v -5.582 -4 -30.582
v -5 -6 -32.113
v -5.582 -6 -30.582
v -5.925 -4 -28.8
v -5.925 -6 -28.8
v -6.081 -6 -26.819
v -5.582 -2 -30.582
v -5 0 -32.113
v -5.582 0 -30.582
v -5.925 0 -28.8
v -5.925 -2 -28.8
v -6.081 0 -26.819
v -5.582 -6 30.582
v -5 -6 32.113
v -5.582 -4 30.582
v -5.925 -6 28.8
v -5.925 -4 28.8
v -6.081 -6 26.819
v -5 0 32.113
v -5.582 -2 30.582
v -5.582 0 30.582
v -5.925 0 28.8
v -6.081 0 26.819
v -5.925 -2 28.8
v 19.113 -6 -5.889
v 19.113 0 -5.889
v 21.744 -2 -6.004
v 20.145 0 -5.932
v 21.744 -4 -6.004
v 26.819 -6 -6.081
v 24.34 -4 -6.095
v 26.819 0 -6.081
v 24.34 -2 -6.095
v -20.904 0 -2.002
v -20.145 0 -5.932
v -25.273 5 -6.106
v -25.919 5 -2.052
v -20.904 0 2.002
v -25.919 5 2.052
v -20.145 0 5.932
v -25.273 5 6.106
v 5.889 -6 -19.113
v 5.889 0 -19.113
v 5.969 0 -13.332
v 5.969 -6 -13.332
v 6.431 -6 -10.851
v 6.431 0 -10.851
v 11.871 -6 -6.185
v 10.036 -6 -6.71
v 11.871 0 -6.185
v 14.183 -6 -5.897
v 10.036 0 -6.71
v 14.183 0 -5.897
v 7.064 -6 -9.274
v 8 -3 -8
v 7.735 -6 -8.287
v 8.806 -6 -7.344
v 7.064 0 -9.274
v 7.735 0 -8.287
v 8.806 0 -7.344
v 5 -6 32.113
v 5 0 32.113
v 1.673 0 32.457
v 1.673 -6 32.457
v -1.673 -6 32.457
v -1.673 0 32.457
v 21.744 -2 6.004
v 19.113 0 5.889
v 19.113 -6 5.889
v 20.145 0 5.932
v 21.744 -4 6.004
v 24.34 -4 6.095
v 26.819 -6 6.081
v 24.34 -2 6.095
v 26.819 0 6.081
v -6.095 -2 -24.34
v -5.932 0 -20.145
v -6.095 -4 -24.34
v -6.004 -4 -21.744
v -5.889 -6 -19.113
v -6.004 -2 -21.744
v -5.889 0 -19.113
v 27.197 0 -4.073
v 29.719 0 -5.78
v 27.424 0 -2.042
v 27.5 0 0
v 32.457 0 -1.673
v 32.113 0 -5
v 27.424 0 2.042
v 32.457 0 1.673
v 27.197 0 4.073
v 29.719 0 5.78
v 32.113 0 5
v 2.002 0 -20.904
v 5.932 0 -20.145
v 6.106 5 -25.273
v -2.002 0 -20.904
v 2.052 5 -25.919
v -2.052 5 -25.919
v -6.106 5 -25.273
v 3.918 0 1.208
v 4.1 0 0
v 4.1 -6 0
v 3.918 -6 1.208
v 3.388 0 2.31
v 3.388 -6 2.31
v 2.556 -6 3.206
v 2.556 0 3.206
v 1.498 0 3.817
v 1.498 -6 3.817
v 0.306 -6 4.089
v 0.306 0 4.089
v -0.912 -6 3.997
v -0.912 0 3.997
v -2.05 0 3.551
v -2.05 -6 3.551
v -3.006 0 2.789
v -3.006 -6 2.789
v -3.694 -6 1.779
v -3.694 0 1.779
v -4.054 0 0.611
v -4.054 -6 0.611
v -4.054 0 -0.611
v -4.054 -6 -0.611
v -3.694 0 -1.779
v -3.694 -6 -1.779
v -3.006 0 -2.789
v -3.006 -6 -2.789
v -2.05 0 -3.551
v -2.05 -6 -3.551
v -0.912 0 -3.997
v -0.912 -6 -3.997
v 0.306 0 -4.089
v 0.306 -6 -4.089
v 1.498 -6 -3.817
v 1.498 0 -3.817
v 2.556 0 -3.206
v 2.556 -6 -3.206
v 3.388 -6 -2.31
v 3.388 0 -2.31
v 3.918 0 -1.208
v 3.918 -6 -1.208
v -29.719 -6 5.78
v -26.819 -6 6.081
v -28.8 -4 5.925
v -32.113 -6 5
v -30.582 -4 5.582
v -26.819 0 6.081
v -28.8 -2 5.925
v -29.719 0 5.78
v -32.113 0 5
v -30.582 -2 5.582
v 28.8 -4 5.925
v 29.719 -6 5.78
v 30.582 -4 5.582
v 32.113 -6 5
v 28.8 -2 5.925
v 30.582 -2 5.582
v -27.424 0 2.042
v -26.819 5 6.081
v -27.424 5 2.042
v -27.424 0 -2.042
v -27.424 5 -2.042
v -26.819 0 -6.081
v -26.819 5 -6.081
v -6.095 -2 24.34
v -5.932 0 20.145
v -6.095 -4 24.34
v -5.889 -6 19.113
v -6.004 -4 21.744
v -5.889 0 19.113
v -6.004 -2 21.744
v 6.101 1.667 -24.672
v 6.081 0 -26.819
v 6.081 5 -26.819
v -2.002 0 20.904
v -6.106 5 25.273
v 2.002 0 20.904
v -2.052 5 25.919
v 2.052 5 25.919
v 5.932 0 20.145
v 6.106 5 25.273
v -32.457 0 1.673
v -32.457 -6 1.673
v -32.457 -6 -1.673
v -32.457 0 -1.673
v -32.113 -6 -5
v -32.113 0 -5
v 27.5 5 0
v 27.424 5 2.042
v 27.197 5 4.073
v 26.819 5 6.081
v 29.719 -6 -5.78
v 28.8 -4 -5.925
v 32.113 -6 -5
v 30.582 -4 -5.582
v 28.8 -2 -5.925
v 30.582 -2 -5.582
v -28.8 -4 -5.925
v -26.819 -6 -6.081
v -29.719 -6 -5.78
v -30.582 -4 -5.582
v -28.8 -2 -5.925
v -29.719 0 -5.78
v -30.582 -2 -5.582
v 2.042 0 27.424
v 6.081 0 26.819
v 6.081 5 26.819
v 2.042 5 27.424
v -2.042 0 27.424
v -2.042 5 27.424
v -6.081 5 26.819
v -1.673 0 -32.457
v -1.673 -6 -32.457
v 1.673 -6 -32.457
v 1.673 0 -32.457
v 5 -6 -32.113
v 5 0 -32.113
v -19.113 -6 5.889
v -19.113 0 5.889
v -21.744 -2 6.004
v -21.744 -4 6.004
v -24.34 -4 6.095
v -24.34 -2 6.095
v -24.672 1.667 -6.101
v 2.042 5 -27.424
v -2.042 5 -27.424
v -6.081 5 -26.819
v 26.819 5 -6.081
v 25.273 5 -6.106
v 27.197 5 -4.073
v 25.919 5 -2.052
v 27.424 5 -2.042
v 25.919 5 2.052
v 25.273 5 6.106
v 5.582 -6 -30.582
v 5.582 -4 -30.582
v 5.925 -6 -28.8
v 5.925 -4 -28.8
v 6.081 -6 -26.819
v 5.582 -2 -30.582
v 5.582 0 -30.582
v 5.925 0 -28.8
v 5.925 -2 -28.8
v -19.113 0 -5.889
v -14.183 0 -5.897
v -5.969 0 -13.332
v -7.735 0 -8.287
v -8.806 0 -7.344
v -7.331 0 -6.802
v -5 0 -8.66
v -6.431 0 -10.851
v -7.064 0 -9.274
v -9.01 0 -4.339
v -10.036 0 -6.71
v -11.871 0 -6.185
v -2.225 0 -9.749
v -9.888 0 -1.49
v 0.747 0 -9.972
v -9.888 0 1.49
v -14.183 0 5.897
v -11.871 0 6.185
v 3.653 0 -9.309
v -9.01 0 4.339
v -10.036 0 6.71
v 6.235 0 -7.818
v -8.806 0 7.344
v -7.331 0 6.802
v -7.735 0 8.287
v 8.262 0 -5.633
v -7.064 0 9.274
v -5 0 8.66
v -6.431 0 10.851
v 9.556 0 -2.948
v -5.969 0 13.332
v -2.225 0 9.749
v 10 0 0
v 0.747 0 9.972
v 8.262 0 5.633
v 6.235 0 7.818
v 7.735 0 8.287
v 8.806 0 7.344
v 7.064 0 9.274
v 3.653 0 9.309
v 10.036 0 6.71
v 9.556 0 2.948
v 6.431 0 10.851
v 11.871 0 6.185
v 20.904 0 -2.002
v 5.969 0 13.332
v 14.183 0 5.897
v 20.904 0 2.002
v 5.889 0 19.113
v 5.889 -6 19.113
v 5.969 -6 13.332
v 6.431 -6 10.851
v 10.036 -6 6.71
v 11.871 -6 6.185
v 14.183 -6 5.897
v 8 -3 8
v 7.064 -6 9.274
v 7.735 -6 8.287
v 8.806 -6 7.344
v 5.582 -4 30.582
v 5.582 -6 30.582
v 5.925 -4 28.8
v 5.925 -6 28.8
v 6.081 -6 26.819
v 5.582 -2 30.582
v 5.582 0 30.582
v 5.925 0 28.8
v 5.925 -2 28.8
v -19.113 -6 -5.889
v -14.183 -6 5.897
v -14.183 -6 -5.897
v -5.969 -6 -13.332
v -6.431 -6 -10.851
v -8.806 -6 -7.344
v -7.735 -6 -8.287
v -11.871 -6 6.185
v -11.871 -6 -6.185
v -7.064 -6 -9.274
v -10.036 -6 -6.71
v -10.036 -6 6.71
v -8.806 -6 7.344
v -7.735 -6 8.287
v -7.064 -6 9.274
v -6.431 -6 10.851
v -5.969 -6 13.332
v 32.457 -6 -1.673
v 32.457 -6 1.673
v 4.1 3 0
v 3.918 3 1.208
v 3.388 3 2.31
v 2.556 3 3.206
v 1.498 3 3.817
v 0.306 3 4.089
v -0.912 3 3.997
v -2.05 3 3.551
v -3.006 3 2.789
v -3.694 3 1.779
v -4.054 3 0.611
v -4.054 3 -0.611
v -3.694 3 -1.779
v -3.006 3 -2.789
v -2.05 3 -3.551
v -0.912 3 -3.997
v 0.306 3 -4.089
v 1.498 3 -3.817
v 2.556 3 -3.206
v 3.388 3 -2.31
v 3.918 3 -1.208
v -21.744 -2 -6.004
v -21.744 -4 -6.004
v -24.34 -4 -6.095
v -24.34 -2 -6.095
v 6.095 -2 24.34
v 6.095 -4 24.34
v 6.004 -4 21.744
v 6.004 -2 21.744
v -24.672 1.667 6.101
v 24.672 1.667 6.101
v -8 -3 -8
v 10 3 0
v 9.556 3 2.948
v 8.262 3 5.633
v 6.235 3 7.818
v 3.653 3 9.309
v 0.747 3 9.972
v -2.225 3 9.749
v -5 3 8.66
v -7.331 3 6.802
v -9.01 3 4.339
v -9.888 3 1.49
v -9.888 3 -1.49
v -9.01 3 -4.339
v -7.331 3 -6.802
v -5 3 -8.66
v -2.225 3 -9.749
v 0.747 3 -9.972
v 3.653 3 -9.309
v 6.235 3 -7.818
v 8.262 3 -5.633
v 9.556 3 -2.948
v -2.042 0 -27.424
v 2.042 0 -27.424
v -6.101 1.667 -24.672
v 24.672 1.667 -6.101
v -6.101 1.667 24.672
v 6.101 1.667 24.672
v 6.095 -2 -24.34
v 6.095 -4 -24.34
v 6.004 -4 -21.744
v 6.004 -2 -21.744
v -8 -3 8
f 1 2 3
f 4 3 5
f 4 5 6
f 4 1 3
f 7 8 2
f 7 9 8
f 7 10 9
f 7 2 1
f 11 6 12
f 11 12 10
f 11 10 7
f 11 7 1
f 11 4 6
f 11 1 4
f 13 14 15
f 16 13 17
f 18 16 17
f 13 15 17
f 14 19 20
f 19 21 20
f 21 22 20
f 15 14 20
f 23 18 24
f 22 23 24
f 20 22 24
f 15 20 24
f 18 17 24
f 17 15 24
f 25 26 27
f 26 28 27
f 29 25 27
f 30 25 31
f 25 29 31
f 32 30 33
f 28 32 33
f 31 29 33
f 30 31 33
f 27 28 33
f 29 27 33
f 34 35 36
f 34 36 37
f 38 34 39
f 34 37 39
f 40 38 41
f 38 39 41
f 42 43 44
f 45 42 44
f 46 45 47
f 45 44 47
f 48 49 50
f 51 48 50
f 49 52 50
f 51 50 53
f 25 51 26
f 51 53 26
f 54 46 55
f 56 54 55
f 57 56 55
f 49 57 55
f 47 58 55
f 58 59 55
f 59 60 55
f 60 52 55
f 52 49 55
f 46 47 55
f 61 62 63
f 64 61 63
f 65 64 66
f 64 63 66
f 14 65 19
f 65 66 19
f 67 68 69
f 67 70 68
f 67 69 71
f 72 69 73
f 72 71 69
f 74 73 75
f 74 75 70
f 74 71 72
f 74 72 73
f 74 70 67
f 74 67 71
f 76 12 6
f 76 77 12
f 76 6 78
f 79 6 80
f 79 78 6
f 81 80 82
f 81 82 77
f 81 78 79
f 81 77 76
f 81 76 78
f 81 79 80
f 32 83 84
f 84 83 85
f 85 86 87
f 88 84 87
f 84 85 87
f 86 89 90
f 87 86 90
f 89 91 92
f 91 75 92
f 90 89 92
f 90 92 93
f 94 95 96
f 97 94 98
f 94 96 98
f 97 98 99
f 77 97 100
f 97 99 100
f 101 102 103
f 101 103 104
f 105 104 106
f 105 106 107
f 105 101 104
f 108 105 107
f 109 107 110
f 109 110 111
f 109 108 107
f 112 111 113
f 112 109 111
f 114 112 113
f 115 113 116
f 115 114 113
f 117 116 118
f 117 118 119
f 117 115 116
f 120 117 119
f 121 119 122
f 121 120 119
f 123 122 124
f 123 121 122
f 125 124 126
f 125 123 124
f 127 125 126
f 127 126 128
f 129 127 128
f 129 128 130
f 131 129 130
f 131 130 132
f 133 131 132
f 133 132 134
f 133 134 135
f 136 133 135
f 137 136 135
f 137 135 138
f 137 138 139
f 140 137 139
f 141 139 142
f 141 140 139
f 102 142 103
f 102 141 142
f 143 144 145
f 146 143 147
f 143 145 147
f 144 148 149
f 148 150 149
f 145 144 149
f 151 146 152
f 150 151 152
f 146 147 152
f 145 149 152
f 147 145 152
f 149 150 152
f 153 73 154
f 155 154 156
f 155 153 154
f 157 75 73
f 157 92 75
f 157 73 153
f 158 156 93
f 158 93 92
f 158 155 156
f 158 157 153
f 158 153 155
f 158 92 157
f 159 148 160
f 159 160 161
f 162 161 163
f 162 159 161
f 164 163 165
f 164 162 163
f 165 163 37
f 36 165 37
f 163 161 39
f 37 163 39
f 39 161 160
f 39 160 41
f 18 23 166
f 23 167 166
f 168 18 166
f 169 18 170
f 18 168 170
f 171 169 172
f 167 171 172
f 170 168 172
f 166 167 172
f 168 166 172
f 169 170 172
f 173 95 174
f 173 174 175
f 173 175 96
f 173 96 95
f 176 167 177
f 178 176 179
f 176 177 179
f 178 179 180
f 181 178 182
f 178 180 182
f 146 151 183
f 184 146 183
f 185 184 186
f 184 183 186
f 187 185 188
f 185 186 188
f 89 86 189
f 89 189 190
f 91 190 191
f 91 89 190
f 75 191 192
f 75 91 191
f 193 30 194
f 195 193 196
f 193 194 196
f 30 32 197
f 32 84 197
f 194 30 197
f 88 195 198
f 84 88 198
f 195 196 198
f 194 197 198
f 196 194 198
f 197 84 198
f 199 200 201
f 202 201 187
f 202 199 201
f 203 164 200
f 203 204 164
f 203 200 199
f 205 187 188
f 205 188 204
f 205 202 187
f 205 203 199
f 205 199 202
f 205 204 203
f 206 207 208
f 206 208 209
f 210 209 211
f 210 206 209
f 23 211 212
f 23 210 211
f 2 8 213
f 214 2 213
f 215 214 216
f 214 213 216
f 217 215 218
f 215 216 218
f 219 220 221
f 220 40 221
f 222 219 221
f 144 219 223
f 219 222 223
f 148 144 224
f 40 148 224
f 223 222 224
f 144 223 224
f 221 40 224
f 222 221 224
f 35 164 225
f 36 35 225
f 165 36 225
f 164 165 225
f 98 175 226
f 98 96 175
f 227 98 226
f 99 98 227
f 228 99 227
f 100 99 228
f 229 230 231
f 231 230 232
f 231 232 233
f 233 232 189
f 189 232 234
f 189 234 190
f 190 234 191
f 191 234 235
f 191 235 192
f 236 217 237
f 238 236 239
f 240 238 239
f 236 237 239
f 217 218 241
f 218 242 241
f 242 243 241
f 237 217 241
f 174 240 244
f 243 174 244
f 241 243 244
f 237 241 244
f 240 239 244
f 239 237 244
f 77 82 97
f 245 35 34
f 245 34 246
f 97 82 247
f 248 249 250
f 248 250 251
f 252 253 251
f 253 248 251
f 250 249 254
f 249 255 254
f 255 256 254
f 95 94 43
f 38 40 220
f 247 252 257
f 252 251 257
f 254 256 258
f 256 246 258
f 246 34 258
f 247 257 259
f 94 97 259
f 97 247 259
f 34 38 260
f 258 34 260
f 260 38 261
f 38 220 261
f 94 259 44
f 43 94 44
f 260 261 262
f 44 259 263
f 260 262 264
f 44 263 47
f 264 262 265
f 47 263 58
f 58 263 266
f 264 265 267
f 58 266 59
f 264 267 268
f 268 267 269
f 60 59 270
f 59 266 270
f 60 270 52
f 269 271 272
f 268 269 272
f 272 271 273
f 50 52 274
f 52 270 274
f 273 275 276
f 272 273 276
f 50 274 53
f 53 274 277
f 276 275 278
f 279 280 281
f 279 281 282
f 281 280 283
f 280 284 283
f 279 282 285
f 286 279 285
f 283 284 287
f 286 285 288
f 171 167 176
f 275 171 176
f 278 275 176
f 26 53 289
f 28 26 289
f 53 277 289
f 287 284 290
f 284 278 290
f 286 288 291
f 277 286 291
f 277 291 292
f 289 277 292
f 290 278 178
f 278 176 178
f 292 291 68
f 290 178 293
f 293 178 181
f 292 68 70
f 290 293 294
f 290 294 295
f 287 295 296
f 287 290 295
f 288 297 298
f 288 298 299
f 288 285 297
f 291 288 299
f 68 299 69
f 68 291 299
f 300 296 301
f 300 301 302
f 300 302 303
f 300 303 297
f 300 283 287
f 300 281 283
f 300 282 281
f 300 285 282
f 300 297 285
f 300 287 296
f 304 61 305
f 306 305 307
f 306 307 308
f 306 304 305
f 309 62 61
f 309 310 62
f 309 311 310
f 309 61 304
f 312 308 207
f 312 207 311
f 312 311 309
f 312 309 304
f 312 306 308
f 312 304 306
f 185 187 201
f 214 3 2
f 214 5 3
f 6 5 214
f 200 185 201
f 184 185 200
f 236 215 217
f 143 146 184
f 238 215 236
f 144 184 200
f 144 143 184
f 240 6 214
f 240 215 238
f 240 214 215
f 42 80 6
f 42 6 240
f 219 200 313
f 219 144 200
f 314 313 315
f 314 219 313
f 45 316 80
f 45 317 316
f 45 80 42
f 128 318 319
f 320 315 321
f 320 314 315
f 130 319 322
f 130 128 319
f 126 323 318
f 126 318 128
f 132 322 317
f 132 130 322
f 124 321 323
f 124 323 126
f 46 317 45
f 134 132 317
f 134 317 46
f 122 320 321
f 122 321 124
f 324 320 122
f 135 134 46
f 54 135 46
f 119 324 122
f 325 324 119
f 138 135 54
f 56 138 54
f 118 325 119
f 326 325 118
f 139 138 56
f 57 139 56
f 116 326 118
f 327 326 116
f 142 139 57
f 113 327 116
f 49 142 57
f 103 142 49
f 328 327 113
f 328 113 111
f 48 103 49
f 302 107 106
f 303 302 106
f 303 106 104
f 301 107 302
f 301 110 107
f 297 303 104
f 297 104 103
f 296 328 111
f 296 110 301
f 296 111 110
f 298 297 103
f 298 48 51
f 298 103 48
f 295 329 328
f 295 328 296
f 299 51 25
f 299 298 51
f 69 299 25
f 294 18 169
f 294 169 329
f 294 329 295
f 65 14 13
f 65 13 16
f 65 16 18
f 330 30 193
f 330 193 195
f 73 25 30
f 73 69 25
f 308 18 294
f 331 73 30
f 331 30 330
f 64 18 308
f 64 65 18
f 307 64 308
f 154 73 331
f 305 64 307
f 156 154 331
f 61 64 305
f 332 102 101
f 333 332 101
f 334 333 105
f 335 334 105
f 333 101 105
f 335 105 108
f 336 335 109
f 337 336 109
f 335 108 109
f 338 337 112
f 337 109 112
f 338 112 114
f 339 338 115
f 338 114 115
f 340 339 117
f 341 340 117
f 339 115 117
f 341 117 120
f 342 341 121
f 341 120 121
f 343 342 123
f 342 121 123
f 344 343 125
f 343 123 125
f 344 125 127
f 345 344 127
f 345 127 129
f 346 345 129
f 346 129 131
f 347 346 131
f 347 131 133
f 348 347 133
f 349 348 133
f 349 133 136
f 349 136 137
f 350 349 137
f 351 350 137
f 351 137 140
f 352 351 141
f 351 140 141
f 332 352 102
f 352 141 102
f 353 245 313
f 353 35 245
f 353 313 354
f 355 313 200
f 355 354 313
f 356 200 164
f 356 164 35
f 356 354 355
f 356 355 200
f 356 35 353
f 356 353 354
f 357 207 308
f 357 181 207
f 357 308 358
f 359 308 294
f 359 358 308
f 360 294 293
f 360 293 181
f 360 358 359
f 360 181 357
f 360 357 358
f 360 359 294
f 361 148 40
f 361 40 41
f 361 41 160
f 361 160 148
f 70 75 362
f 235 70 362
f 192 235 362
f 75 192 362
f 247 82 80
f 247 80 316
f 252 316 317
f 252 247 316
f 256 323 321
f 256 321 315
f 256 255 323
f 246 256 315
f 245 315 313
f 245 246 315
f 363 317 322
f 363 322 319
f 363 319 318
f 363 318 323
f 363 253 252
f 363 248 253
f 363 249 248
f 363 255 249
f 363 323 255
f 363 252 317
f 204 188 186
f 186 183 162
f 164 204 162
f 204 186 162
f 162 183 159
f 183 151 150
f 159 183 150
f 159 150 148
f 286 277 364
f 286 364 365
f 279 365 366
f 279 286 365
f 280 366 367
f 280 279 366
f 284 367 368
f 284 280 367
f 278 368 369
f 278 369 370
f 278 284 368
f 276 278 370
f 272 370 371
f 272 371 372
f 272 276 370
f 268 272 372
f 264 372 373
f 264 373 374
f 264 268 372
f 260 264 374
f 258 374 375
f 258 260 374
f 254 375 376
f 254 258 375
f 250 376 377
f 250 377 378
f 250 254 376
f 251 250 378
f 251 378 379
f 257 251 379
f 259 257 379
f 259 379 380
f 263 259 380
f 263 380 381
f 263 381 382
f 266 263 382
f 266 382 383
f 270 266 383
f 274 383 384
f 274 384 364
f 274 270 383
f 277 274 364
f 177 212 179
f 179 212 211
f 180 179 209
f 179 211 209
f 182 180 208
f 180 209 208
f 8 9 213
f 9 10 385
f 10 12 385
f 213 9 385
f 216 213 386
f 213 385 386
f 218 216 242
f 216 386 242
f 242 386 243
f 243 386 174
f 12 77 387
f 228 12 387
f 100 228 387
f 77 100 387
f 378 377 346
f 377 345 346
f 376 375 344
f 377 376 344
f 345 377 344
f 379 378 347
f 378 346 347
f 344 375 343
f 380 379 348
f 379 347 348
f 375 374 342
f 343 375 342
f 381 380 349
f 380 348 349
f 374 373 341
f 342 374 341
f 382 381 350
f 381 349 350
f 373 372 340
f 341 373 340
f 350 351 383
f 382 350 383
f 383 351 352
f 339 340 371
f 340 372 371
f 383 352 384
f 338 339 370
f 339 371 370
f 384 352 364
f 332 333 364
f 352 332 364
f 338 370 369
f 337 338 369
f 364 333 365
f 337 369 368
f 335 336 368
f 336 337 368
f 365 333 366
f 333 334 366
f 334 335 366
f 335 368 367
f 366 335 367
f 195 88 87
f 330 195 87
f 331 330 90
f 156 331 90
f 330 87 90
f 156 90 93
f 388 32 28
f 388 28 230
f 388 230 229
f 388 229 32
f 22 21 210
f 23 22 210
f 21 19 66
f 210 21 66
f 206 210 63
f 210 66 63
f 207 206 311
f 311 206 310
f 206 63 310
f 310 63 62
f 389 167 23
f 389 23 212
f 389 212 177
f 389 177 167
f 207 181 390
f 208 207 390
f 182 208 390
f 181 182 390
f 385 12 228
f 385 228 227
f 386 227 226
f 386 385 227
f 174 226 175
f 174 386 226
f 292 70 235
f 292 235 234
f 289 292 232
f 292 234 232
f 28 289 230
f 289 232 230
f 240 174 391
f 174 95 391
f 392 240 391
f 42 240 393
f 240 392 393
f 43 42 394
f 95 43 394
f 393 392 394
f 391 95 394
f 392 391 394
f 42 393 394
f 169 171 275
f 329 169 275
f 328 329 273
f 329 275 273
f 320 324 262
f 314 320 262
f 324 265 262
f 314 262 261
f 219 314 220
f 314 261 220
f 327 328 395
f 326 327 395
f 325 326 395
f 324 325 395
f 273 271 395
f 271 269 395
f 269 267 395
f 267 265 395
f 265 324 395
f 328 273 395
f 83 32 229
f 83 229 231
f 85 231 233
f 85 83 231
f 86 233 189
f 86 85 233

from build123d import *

# Parameters (mm, degrees)
F0_R         = 10
F0_R_2       = 4.1
F1_DEPTH     = 6
F2_DEPTH     = 5
F3_T4_ANGLE  = 122.6619234407
F3_T9_ANGLE  = 122.6619234407
F3_T14_ANGLE = 122.6619234407
F3_T19_ANGLE = 122.6619234407
F4_DEPTH     = 3


# Not quite as in the source:
# - a fillet or chamfer that OpenCascade refuses, or shapes differently, is made with other operations: its cross-section is extruded or revolved along the edge and cut away or added


with BuildPart() as f1:
    # F0 (on Front) → F1 (new body)
    with BuildSketch(Plane.XZ):
        with BuildLine():
            ThreePointArc((6.0812075174, 26.8191893079), (0, 27.5), (-6.0812075174, 26.8191893079))
            add(Edge.make_bspline(
                [(-6.0812075174, 26.8191893079), (-6.1732948606, 24.4249400285), (-5.9896734895, 21.7342705806), (-5.8889521452, 19.1133524697)],
                knots=[0.1196507891, 0.1196507891, 0.1196507891, 0.1196507891, 0.2585348809, 0.2585348809, 0.2585348809, 0.2585348809], degree=3))
            ThreePointArc((-5.8889521452, 19.1133524697), (0, 20), (5.8889521452, 19.1133524697))
            add(Edge.make_bspline(
                [(6.0812075174, 26.8191893079), (6.1732948606, 24.4249400285), (5.9896734895, 21.7342705806), (5.8889521452, 19.1133524697)],
                knots=[0.1196507891, 0.1196507891, 0.1196507891, 0.1196507891, 0.2585348809, 0.2585348809, 0.2585348809, 0.2585348809], degree=3))
        make_face()
        with BuildLine():
            add(Edge.make_bspline(
                [(26.8191893079, 6.0812075174), (28.8818720221, 6.0018728496), (30.7245490644, 5.7179047345), (32.1130814467, 5)],
                knots=[0.8803492109, 0.8803492109, 0.8803492109, 0.8803492109, 1, 1, 1, 1], degree=3))
            ThreePointArc((26.8191893079, 6.0812075174), (27.3292673334, 3.0595991595), (27.5, 0))
            ThreePointArc((27.5, 0), (27.3292673334, -3.0595991595), (26.8191893079, -6.0812075174))
            add(Edge.make_bspline(
                [(26.8191893079, -6.0812075174), (28.8818720221, -6.0018728496), (30.7245490644, -5.7179047345), (32.1130814467, -5)],
                knots=[0.8803492109, 0.8803492109, 0.8803492109, 0.8803492109, 1, 1, 1, 1], degree=3))
            ThreePointArc((32.1130814467, -5), (32.4031259836, -2.5074741258), (32.5, 0))
            ThreePointArc((32.5, 0), (32.4031259836, 2.5074741258), (32.1130814467, 5))
        make_face()
        with BuildLine():
            ThreePointArc((5, 32.1130814467), (0, 32.5), (-5, 32.1130814467))
            add(Edge.make_bspline(
                [(-5, 32.1130814467), (-5.7179047345, 30.7245490644), (-6.0018728496, 28.8818720221), (-6.0812075174, 26.8191893079)],
                knots=[0, 0, 0, 0, 0.1196507891, 0.1196507891, 0.1196507891, 0.1196507891], degree=3))
            ThreePointArc((-6.0812075174, 26.8191893079), (0, 27.5), (6.0812075174, 26.8191893079))
            add(Edge.make_bspline(
                [(5, 32.1130814467), (5.7179047345, 30.7245490644), (6.0018728496, 28.8818720221), (6.0812075174, 26.8191893079)],
                knots=[0, 0, 0, 0, 0.1196507891, 0.1196507891, 0.1196507891, 0.1196507891], degree=3))
        make_face()
        with BuildLine():
            add(Edge.make_bspline(
                [(-5, -32.1130814467), (-5.7179047345, -30.7245490644), (-6.0018728496, -28.8818720221), (-6.0812075174, -26.8191893079)],
                knots=[0, 0, 0, 0, 0.1196507891, 0.1196507891, 0.1196507891, 0.1196507891], degree=3))
            ThreePointArc((-5, -32.1130814467), (0, -32.5), (5, -32.1130814467))
            add(Edge.make_bspline(
                [(5, -32.1130814467), (5.7179047345, -30.7245490644), (6.0018728496, -28.8818720221), (6.0812075174, -26.8191893079)],
                knots=[0, 0, 0, 0, 0.1196507891, 0.1196507891, 0.1196507891, 0.1196507891], degree=3))
            ThreePointArc((6.0812075174, -26.8191893079), (0, -27.5), (-6.0812075174, -26.8191893079))
        make_face()
        with BuildLine():
            add(Edge.make_bspline(
                [(-26.8191893079, 6.0812075174), (-28.8818720221, 6.0018728496), (-30.7245490644, 5.7179047345), (-32.1130814467, 5)],
                knots=[0.8803492109, 0.8803492109, 0.8803492109, 0.8803492109, 1, 1, 1, 1], degree=3))
            ThreePointArc((-32.1130814467, 5), (-32.5, 0), (-32.1130814467, -5))
            add(Edge.make_bspline(
                [(-26.8191893079, -6.0812075174), (-28.8818720221, -6.0018728496), (-30.7245490644, -5.7179047345), (-32.1130814467, -5)],
                knots=[0.8803492109, 0.8803492109, 0.8803492109, 0.8803492109, 1, 1, 1, 1], degree=3))
            ThreePointArc((-26.8191893079, -6.0812075174), (-27.5, 0), (-26.8191893079, 6.0812075174))
        make_face()
        with BuildLine():
            add(Edge.make_bspline(
                [(-5.8889521452, 19.1133524697), (-5.713837119, 14.556600899), (-5.864780991, 5.864780991), (-14.556600899, 5.713837119), (-19.1133524697, 5.8889521452)],
                knots=[0.2585348809, 0.2585348809, 0.2585348809, 0.2585348809, 0.5, 0.7414651191, 0.7414651191, 0.7414651191, 0.7414651191], degree=3))
            ThreePointArc((-19.1133524697, 5.8889521452), (-20, 0), (-19.1133524697, -5.8889521452))
            add(Edge.make_bspline(
                [(-5.8889521452, -19.1133524697), (-5.713837119, -14.556600899), (-5.864780991, -5.864780991), (-14.556600899, -5.713837119), (-19.1133524697, -5.8889521452)],
                knots=[0.2585348809, 0.2585348809, 0.2585348809, 0.2585348809, 0.5, 0.7414651191, 0.7414651191, 0.7414651191, 0.7414651191], degree=3))
            ThreePointArc((-5.8889521452, -19.1133524697), (0, -20), (5.8889521452, -19.1133524697))
            add(Edge.make_bspline(
                [(5.8889521452, -19.1133524697), (5.713837119, -14.556600899), (5.864780991, -5.864780991), (14.556600899, -5.713837119), (19.1133524697, -5.8889521452)],
                knots=[0.2585348809, 0.2585348809, 0.2585348809, 0.2585348809, 0.5, 0.7414651191, 0.7414651191, 0.7414651191, 0.7414651191], degree=3))
            ThreePointArc((19.1133524697, -5.8889521452), (19.7770959622, -2.9776627248), (20, 0))
            ThreePointArc((20, 0), (19.7770959622, 2.9776627248), (19.1133524697, 5.8889521452))
            add(Edge.make_bspline(
                [(5.8889521452, 19.1133524697), (5.713837119, 14.556600899), (5.864780991, 5.864780991), (14.556600899, 5.713837119), (19.1133524697, 5.8889521452)],
                knots=[0.2585348809, 0.2585348809, 0.2585348809, 0.2585348809, 0.5, 0.7414651191, 0.7414651191, 0.7414651191, 0.7414651191], degree=3))
            ThreePointArc((5.8889521452, 19.1133524697), (0, 20), (-5.8889521452, 19.1133524697))
        make_face()
        Circle(F0_R, mode=Mode.SUBTRACT)
        with BuildLine():
            add(Edge.make_bspline(
                [(-6.0812075174, -26.8191893079), (-6.1732948606, -24.4249400285), (-5.9896734895, -21.7342705806), (-5.8889521452, -19.1133524697)],
                knots=[0.1196507891, 0.1196507891, 0.1196507891, 0.1196507891, 0.2585348809, 0.2585348809, 0.2585348809, 0.2585348809], degree=3))
            ThreePointArc((-6.0812075174, -26.8191893079), (0, -27.5), (6.0812075174, -26.8191893079))
            add(Edge.make_bspline(
                [(6.0812075174, -26.8191893079), (6.1732948606, -24.4249400285), (5.9896734895, -21.7342705806), (5.8889521452, -19.1133524697)],
                knots=[0.1196507891, 0.1196507891, 0.1196507891, 0.1196507891, 0.2585348809, 0.2585348809, 0.2585348809, 0.2585348809], degree=3))
            ThreePointArc((5.8889521452, -19.1133524697), (0, -20), (-5.8889521452, -19.1133524697))
        make_face()
        with BuildLine():
            ThreePointArc((27.5, 0), (27.3292673334, 3.0595991595), (26.8191893079, 6.0812075174))
            add(Edge.make_bspline(
                [(19.1133524697, 5.8889521452), (21.7342705806, 5.9896734895), (24.4249400285, 6.1732948606), (26.8191893079, 6.0812075174)],
                knots=[0.7414651191, 0.7414651191, 0.7414651191, 0.7414651191, 0.8803492109, 0.8803492109, 0.8803492109, 0.8803492109], degree=3))
            ThreePointArc((19.1133524697, 5.8889521452), (19.7770959622, 2.9776627248), (20, 0))
            ThreePointArc((20, 0), (19.7770959622, -2.9776627248), (19.1133524697, -5.8889521452))
            add(Edge.make_bspline(
                [(19.1133524697, -5.8889521452), (21.7342705806, -5.9896734895), (24.4249400285, -6.1732948606), (26.8191893079, -6.0812075174)],
                knots=[0.7414651191, 0.7414651191, 0.7414651191, 0.7414651191, 0.8803492109, 0.8803492109, 0.8803492109, 0.8803492109], degree=3))
            ThreePointArc((26.8191893079, -6.0812075174), (27.3292673334, -3.0595991595), (27.5, 0))
        make_face()
        with BuildLine():
            add(Edge.make_bspline(
                [(-19.1133524697, 5.8889521452), (-21.7342705806, 5.9896734895), (-24.4249400285, 6.1732948606), (-26.8191893079, 6.0812075174)],
                knots=[0.7414651191, 0.7414651191, 0.7414651191, 0.7414651191, 0.8803492109, 0.8803492109, 0.8803492109, 0.8803492109], degree=3))
            ThreePointArc((-26.8191893079, 6.0812075174), (-27.5, 0), (-26.8191893079, -6.0812075174))
            add(Edge.make_bspline(
                [(-19.1133524697, -5.8889521452), (-21.7342705806, -5.9896734895), (-24.4249400285, -6.1732948606), (-26.8191893079, -6.0812075174)],
                knots=[0.7414651191, 0.7414651191, 0.7414651191, 0.7414651191, 0.8803492109, 0.8803492109, 0.8803492109, 0.8803492109], degree=3))
            ThreePointArc((-19.1133524697, -5.8889521452), (-20, 0), (-19.1133524697, 5.8889521452))
        make_face()
        Circle(F0_R)
        Circle(F0_R_2, mode=Mode.SUBTRACT)
    extrude(amount=F1_DEPTH)

    # F0 (on Front) → F2 (join)
    with BuildSketch(Plane.XZ):
        with BuildLine():
            ThreePointArc((6.0812075174, 26.8191893079), (0, 27.5), (-6.0812075174, 26.8191893079))
            add(Edge.make_bspline(
                [(-6.0812075174, 26.8191893079), (-6.1732948606, 24.4249400285), (-5.9896734895, 21.7342705806), (-5.8889521452, 19.1133524697)],
                knots=[0.1196507891, 0.1196507891, 0.1196507891, 0.1196507891, 0.2585348809, 0.2585348809, 0.2585348809, 0.2585348809], degree=3))
            ThreePointArc((-5.8889521452, 19.1133524697), (0, 20), (5.8889521452, 19.1133524697))
            add(Edge.make_bspline(
                [(6.0812075174, 26.8191893079), (6.1732948606, 24.4249400285), (5.9896734895, 21.7342705806), (5.8889521452, 19.1133524697)],
                knots=[0.1196507891, 0.1196507891, 0.1196507891, 0.1196507891, 0.2585348809, 0.2585348809, 0.2585348809, 0.2585348809], degree=3))
        make_face()
        with BuildLine():
            ThreePointArc((27.5, 0), (27.3292673334, 3.0595991595), (26.8191893079, 6.0812075174))
            add(Edge.make_bspline(
                [(19.1133524697, 5.8889521452), (21.7342705806, 5.9896734895), (24.4249400285, 6.1732948606), (26.8191893079, 6.0812075174)],
                knots=[0.7414651191, 0.7414651191, 0.7414651191, 0.7414651191, 0.8803492109, 0.8803492109, 0.8803492109, 0.8803492109], degree=3))
            ThreePointArc((19.1133524697, 5.8889521452), (19.7770959622, 2.9776627248), (20, 0))
            ThreePointArc((20, 0), (19.7770959622, -2.9776627248), (19.1133524697, -5.8889521452))
            add(Edge.make_bspline(
                [(19.1133524697, -5.8889521452), (21.7342705806, -5.9896734895), (24.4249400285, -6.1732948606), (26.8191893079, -6.0812075174)],
                knots=[0.7414651191, 0.7414651191, 0.7414651191, 0.7414651191, 0.8803492109, 0.8803492109, 0.8803492109, 0.8803492109], degree=3))
            ThreePointArc((26.8191893079, -6.0812075174), (27.3292673334, -3.0595991595), (27.5, 0))
        make_face()
        with BuildLine():
            add(Edge.make_bspline(
                [(-19.1133524697, 5.8889521452), (-21.7342705806, 5.9896734895), (-24.4249400285, 6.1732948606), (-26.8191893079, 6.0812075174)],
                knots=[0.7414651191, 0.7414651191, 0.7414651191, 0.7414651191, 0.8803492109, 0.8803492109, 0.8803492109, 0.8803492109], degree=3))
            ThreePointArc((-26.8191893079, 6.0812075174), (-27.5, 0), (-26.8191893079, -6.0812075174))
            add(Edge.make_bspline(
                [(-19.1133524697, -5.8889521452), (-21.7342705806, -5.9896734895), (-24.4249400285, -6.1732948606), (-26.8191893079, -6.0812075174)],
                knots=[0.7414651191, 0.7414651191, 0.7414651191, 0.7414651191, 0.8803492109, 0.8803492109, 0.8803492109, 0.8803492109], degree=3))
            ThreePointArc((-19.1133524697, -5.8889521452), (-20, 0), (-19.1133524697, 5.8889521452))
        make_face()
        with BuildLine():
            add(Edge.make_bspline(
                [(-6.0812075174, -26.8191893079), (-6.1732948606, -24.4249400285), (-5.9896734895, -21.7342705806), (-5.8889521452, -19.1133524697)],
                knots=[0.1196507891, 0.1196507891, 0.1196507891, 0.1196507891, 0.2585348809, 0.2585348809, 0.2585348809, 0.2585348809], degree=3))
            ThreePointArc((-6.0812075174, -26.8191893079), (0, -27.5), (6.0812075174, -26.8191893079))
            add(Edge.make_bspline(
                [(6.0812075174, -26.8191893079), (6.1732948606, -24.4249400285), (5.9896734895, -21.7342705806), (5.8889521452, -19.1133524697)],
                knots=[0.1196507891, 0.1196507891, 0.1196507891, 0.1196507891, 0.2585348809, 0.2585348809, 0.2585348809, 0.2585348809], degree=3))
            ThreePointArc((5.8889521452, -19.1133524697), (0, -20), (-5.8889521452, -19.1133524697))
        make_face()
    extrude(amount=-F2_DEPTH)

    # F3: chamfer of 6 on 4 edges, made by hand


with BuildPart() as f3_tool2:
    # F3_s3 → F3_t4 (revolve)
    with BuildSketch(Plane(origin=(0, 0, 0), x_dir=(0, 1, 0), z_dir=(-0.4797494316, 0, -0.8774055407))):
        Polygon((-1, -20), (5, -26), (5, -20), align=None)
    revolve(axis=Axis((0, 5, 0), (0, 1, 0)), revolution_arc=F3_T4_ANGLE)

    split(bisect_by=Plane.XZ, keep=Keep.BOTTOM)


with BuildPart() as f1_1:
    add(f1.part)

    # F3_t1: cut F3_tool2
    add(f3_tool2.part, mode=Mode.SUBTRACT)


with BuildPart() as f3_tool7:
    # F3_s8 → F3_t9 (revolve)
    with BuildSketch(Plane(origin=(0, 0, 0), x_dir=(0, 1, 0), z_dir=(-0.8774055407, 0, 0.4797494316))):
        Polygon((-1, -20), (5, -26), (5, -20), align=None)
    revolve(axis=Axis((0, 5, 0), (0, 1, 0)), revolution_arc=F3_T9_ANGLE)

    split(bisect_by=Plane.XZ, keep=Keep.BOTTOM)


with BuildPart() as f1_2:
    add(f1_1.part)

    # F3_t6: cut F3_tool7
    add(f3_tool7.part, mode=Mode.SUBTRACT)


with BuildPart() as f3_tool12:
    # F3_s13 → F3_t14 (revolve)
    with BuildSketch(Plane(origin=(0, 0, 0), x_dir=(0, 1, 0), z_dir=(0.8774055407, 0, -0.4797494316))):
        Polygon((-1, -20), (5, -26), (5, -20), align=None)
    revolve(axis=Axis((0, 5, 0), (0, 1, 0)), revolution_arc=F3_T14_ANGLE)

    split(bisect_by=Plane.XZ, keep=Keep.BOTTOM)


with BuildPart() as f1_3:
    add(f1_2.part)

    # F3_t11: cut F3_tool12
    add(f3_tool12.part, mode=Mode.SUBTRACT)


with BuildPart() as f3_tool17:
    # F3_s18 → F3_t19 (revolve)
    with BuildSketch(Plane(origin=(0, 0, 0), x_dir=(0, 1, 0), z_dir=(0.4797494316, 0, 0.8774055407))):
        Polygon((-1, -20), (5, -26), (5, -20), align=None)
    revolve(axis=Axis((0, 5, 0), (0, 1, 0)), revolution_arc=F3_T19_ANGLE)

    split(bisect_by=Plane.XZ, keep=Keep.BOTTOM)


with BuildPart() as f1_4:
    add(f1_3.part)

    # F3_t16: cut F3_tool17
    add(f3_tool17.part, mode=Mode.SUBTRACT)

    # F0 (on Front) → F4 (join)
    with BuildSketch(Plane.XZ):
        Circle(F0_R)
        Circle(F0_R_2, mode=Mode.SUBTRACT)
    extrude(amount=-F4_DEPTH)


solid = f1_4.part
